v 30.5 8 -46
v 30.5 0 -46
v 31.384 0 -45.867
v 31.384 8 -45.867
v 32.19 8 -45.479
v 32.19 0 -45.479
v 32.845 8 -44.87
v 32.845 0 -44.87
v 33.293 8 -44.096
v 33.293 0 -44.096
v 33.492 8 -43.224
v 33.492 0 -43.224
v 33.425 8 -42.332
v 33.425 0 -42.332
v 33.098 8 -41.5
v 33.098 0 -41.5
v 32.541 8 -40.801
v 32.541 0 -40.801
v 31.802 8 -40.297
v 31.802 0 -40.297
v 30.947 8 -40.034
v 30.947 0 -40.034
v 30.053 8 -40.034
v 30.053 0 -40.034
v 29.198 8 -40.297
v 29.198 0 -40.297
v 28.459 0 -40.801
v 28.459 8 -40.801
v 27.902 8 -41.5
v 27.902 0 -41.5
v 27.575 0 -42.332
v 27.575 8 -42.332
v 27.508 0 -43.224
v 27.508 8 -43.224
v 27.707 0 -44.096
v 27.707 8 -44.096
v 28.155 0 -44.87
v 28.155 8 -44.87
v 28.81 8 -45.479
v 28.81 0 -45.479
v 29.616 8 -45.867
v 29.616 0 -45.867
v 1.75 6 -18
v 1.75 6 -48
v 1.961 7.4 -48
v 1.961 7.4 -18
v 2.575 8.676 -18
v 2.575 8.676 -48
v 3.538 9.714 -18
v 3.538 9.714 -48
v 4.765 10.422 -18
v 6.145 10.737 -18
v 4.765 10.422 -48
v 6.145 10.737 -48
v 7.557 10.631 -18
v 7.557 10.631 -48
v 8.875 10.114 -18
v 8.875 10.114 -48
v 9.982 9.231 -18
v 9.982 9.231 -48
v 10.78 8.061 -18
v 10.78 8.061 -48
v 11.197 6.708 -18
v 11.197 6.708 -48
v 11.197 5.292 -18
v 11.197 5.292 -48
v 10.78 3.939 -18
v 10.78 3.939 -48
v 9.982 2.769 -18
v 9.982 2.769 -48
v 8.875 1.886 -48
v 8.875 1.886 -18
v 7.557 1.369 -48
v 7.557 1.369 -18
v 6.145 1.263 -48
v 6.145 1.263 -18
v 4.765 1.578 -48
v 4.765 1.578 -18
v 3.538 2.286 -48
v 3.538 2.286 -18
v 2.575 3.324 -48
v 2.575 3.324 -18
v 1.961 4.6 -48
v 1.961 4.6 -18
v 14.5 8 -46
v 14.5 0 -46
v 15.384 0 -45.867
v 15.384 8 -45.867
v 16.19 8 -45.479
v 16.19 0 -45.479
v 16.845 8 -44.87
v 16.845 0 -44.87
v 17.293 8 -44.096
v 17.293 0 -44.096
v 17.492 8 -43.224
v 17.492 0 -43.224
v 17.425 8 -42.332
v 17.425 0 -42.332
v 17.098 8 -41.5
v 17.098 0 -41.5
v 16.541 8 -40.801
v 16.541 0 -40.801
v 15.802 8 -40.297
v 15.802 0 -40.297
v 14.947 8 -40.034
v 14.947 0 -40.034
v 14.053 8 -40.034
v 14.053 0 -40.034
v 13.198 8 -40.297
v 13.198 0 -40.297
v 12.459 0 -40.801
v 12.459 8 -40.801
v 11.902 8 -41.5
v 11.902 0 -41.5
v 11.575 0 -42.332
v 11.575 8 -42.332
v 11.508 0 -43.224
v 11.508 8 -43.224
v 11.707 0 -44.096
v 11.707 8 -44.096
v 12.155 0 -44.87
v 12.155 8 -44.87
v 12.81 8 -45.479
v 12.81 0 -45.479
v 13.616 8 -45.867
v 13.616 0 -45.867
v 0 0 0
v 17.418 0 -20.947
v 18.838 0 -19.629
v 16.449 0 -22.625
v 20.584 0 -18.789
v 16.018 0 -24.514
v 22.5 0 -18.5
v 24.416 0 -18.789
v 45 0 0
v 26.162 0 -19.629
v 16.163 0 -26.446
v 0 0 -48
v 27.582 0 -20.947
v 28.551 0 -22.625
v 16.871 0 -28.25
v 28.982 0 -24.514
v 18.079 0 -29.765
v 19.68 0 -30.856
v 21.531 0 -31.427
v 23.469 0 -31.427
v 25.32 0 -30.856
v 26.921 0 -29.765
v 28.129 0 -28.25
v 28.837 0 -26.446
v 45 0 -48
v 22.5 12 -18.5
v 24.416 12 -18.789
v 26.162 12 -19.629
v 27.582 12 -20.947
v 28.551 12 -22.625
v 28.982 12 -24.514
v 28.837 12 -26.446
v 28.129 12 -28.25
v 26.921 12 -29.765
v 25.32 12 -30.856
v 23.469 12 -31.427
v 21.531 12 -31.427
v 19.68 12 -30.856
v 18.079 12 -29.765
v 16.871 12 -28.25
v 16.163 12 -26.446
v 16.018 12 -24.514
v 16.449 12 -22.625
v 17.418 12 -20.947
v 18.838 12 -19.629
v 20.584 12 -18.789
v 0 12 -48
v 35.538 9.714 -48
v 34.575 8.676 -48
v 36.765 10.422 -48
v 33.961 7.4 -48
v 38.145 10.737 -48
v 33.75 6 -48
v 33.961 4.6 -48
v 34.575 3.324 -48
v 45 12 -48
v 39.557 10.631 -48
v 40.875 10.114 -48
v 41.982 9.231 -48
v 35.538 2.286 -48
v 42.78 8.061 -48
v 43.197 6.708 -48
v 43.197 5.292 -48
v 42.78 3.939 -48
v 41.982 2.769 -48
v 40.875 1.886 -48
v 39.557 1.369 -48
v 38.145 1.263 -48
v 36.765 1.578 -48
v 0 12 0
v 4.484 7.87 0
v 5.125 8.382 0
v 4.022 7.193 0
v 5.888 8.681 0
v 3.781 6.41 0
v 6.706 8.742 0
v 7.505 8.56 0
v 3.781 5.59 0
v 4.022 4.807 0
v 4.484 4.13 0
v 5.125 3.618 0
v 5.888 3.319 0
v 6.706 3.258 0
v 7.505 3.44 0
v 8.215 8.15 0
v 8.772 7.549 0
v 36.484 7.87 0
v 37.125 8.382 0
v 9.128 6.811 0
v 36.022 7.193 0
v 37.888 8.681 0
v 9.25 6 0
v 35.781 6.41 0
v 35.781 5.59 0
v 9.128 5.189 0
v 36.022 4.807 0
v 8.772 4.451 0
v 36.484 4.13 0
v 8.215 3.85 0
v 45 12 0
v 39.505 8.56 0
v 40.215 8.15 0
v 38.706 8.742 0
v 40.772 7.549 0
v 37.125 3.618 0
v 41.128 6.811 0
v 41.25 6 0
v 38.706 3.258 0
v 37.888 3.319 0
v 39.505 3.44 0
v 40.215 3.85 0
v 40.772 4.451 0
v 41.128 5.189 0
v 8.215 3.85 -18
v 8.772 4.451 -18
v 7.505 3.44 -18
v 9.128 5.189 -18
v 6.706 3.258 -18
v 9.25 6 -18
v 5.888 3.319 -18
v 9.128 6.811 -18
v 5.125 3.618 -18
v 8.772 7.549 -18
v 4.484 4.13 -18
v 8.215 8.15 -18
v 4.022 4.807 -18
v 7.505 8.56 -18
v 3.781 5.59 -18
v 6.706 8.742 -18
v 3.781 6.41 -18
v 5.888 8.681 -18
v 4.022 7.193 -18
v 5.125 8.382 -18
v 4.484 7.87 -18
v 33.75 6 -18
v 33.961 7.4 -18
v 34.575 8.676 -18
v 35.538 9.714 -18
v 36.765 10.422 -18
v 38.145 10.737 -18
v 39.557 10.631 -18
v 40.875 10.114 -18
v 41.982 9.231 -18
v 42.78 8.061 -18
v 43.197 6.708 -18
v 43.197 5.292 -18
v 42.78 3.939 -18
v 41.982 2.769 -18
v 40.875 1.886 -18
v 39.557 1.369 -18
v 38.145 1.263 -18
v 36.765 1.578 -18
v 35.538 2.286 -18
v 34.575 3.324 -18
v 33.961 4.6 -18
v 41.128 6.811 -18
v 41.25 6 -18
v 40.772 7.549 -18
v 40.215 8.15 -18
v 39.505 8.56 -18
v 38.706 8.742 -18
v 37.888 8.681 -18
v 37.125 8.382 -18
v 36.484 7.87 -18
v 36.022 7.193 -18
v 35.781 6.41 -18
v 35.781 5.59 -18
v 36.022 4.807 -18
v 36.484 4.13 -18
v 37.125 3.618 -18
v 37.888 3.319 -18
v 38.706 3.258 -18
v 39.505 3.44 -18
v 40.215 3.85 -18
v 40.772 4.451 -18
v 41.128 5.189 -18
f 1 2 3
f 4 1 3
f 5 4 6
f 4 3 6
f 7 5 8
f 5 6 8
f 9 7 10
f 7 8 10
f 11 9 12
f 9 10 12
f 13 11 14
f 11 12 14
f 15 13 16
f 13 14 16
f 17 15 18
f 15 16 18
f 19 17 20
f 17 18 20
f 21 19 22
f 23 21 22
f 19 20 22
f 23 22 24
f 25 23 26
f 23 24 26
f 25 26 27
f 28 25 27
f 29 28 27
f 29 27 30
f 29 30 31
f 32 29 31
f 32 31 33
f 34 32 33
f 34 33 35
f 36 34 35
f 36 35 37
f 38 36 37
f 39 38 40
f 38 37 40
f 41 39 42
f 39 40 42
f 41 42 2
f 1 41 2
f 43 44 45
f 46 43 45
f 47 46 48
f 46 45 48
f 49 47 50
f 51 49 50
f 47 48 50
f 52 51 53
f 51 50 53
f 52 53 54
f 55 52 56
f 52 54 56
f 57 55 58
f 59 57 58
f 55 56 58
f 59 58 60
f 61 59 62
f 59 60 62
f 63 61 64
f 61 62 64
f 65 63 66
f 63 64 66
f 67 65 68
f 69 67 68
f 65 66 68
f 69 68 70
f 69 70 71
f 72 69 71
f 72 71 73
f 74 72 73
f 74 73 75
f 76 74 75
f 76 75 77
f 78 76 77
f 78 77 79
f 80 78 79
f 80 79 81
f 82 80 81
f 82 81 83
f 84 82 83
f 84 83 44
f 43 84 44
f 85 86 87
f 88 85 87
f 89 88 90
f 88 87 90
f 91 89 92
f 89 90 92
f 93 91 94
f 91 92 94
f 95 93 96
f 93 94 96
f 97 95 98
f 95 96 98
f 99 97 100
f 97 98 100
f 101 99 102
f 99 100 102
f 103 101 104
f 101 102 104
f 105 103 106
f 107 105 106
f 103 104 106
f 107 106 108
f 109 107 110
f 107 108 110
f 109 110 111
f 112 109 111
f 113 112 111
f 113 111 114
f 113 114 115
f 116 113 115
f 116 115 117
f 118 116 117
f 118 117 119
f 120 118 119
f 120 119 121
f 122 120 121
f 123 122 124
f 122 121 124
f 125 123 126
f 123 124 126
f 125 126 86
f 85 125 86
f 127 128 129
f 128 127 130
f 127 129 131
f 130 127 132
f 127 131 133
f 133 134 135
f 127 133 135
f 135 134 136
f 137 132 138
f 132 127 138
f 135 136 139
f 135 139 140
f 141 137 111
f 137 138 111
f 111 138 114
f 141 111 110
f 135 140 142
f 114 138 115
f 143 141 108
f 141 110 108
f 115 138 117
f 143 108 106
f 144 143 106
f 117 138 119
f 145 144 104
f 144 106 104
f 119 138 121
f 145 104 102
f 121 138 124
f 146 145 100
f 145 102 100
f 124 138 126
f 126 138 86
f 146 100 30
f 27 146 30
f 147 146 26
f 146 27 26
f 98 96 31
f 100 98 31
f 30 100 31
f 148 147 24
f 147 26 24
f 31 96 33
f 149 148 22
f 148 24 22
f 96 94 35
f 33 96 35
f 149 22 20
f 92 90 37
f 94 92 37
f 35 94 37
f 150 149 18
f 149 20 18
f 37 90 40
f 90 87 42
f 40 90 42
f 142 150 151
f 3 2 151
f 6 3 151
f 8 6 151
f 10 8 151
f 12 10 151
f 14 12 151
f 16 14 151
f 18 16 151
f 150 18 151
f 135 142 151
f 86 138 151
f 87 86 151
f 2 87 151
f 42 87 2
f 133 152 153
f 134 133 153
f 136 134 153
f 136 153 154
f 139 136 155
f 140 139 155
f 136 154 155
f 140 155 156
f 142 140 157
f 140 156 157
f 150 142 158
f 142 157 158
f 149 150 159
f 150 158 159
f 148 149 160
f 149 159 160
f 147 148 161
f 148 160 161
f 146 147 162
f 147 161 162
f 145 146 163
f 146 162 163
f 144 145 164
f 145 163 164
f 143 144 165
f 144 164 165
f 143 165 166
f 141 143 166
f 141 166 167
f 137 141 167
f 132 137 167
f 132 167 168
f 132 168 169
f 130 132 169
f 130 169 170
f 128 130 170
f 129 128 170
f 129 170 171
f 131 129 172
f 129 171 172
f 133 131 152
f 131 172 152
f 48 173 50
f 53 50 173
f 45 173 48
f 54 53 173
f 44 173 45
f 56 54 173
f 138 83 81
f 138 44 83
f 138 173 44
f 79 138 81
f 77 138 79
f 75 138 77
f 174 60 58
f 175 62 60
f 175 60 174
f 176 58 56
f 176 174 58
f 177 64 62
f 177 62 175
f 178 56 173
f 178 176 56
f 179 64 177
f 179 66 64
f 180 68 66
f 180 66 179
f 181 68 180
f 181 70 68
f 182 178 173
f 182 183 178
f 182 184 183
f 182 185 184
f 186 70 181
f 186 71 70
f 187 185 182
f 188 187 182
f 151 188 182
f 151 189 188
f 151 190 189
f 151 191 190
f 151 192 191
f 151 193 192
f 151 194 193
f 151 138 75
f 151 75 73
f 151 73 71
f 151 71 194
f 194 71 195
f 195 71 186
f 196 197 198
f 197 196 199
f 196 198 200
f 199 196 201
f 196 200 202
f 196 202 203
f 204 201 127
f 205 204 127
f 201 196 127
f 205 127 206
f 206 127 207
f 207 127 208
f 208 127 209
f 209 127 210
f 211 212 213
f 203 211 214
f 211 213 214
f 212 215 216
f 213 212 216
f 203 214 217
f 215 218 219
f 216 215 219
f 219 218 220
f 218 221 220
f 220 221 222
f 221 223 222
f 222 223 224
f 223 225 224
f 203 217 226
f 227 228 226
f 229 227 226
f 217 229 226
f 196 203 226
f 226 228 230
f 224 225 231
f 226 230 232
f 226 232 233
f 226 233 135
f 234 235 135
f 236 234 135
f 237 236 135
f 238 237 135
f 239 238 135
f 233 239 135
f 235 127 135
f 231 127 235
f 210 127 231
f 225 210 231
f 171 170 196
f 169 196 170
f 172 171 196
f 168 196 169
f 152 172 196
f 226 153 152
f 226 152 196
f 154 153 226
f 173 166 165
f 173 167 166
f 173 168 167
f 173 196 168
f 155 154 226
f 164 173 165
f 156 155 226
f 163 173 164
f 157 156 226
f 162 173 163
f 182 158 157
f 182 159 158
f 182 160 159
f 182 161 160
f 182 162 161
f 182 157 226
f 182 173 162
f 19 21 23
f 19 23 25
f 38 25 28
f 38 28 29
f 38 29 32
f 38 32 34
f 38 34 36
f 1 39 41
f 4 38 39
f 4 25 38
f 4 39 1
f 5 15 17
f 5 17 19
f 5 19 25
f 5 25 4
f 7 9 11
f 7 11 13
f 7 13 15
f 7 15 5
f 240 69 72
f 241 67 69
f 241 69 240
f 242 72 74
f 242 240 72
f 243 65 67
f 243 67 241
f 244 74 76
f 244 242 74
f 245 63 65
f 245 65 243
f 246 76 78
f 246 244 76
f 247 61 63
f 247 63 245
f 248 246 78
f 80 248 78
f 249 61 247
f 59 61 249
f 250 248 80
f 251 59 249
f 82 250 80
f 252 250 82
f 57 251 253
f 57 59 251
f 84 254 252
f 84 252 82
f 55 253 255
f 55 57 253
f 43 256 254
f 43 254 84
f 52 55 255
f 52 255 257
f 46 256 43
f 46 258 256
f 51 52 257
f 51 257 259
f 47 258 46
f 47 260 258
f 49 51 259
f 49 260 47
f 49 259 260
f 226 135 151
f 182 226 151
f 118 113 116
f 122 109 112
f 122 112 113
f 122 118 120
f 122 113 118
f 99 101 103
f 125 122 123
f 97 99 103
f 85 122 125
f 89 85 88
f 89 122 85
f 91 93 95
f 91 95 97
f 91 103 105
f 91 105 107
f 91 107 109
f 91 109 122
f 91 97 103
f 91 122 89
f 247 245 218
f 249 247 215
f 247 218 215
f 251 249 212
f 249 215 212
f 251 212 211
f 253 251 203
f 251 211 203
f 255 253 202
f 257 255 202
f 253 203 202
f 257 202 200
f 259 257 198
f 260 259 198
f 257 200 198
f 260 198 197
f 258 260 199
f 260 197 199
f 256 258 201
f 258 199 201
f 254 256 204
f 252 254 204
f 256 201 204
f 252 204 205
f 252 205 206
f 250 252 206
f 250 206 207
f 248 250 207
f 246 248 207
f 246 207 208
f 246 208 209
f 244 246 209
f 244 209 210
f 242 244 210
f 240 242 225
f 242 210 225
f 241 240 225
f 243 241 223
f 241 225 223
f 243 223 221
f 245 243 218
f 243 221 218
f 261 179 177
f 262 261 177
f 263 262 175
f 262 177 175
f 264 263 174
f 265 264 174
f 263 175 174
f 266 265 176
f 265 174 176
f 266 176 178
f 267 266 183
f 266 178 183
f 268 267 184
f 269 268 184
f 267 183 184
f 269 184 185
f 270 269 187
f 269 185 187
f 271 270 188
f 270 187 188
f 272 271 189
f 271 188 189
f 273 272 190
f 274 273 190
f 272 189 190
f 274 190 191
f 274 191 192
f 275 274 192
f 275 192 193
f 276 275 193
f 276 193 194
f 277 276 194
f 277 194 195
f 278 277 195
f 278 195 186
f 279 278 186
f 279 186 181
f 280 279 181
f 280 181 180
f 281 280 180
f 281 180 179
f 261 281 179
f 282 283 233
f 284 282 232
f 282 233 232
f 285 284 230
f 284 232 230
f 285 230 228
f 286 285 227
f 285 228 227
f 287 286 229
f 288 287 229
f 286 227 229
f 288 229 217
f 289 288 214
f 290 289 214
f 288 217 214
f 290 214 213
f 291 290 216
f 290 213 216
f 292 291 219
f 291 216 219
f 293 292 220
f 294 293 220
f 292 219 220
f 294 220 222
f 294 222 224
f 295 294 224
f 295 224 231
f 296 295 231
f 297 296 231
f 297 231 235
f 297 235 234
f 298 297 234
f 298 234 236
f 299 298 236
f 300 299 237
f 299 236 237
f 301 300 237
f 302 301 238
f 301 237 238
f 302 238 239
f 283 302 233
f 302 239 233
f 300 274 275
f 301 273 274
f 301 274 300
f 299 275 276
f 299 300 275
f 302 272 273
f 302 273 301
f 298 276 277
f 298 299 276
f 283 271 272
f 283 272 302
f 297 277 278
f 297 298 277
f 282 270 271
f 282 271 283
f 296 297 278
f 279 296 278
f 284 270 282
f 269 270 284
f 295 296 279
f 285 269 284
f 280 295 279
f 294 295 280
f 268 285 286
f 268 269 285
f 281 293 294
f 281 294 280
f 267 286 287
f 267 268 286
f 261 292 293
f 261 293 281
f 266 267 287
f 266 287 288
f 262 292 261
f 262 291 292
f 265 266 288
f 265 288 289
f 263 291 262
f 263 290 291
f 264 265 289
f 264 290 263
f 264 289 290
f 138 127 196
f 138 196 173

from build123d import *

# Parameters (mm, degrees)
SKETCH_1_W                = 45
SKETCH_1_H                = 48
EXTRUDE_1_DEPTH           = 12
SKETCH_2_R                = 6.5
CUT_EXTRUDE_1_DEPTH       = 12
HOLE_WIZARD_1_D           = 5.5
HOLE_WIZARD_1_CBORE_D     = 9.5
HOLE_WIZARD_1_CBORE_DEPTH = 30
SKETCH_14_R               = 3
CUT_EXTRUDE_2_DEPTH       = 8


with BuildPart() as part:
    # 草图1 → 凸台-拉伸1 (new body)
    with BuildSketch(Plane(origin=(0, 0, 0), x_dir=(1, 0, 0), z_dir=(0, 1, 0))):
        with Locations((22.5, 24)):
            Rectangle(SKETCH_1_W, SKETCH_1_H)
    extrude(amount=EXTRUDE_1_DEPTH)

    # 草图2 → 切除-拉伸1 (cut)
    with BuildSketch(Plane(origin=(0, 12, 0), x_dir=(1, 0, 0), z_dir=(0, 1, 0))):
        with Locations(Location((22.5, 25, 0), (0, 0, 270))):
            Circle(SKETCH_2_R)
    extrude(amount=-CUT_EXTRUDE_1_DEPTH, mode=Mode.SUBTRACT)

    # 打孔尺寸根据内六角圆柱头螺钉的类型1 (through all)
    with Locations(Plane(origin=(0, 0, -48), x_dir=(-1, 0, 0), z_dir=(0, 0, -1))):
        with Locations((-38.5, 6), (-6.5, 6)):
            CounterBoreHole(HOLE_WIZARD_1_D / 2, HOLE_WIZARD_1_CBORE_D / 2, HOLE_WIZARD_1_CBORE_DEPTH)

    # 草图14 → 切除-拉伸2 (cut)
    with BuildSketch(Plane.XZ):
        with Locations(Location((14.5, -43, 0), (0, 0, 270))):
            Circle(SKETCH_14_R)
        with Locations(Location((30.5, -43, 0), (0, 0, 270))):
            Circle(SKETCH_14_R)
    extrude(amount=-CUT_EXTRUDE_2_DEPTH, mode=Mode.SUBTRACT)


solid = part.part
